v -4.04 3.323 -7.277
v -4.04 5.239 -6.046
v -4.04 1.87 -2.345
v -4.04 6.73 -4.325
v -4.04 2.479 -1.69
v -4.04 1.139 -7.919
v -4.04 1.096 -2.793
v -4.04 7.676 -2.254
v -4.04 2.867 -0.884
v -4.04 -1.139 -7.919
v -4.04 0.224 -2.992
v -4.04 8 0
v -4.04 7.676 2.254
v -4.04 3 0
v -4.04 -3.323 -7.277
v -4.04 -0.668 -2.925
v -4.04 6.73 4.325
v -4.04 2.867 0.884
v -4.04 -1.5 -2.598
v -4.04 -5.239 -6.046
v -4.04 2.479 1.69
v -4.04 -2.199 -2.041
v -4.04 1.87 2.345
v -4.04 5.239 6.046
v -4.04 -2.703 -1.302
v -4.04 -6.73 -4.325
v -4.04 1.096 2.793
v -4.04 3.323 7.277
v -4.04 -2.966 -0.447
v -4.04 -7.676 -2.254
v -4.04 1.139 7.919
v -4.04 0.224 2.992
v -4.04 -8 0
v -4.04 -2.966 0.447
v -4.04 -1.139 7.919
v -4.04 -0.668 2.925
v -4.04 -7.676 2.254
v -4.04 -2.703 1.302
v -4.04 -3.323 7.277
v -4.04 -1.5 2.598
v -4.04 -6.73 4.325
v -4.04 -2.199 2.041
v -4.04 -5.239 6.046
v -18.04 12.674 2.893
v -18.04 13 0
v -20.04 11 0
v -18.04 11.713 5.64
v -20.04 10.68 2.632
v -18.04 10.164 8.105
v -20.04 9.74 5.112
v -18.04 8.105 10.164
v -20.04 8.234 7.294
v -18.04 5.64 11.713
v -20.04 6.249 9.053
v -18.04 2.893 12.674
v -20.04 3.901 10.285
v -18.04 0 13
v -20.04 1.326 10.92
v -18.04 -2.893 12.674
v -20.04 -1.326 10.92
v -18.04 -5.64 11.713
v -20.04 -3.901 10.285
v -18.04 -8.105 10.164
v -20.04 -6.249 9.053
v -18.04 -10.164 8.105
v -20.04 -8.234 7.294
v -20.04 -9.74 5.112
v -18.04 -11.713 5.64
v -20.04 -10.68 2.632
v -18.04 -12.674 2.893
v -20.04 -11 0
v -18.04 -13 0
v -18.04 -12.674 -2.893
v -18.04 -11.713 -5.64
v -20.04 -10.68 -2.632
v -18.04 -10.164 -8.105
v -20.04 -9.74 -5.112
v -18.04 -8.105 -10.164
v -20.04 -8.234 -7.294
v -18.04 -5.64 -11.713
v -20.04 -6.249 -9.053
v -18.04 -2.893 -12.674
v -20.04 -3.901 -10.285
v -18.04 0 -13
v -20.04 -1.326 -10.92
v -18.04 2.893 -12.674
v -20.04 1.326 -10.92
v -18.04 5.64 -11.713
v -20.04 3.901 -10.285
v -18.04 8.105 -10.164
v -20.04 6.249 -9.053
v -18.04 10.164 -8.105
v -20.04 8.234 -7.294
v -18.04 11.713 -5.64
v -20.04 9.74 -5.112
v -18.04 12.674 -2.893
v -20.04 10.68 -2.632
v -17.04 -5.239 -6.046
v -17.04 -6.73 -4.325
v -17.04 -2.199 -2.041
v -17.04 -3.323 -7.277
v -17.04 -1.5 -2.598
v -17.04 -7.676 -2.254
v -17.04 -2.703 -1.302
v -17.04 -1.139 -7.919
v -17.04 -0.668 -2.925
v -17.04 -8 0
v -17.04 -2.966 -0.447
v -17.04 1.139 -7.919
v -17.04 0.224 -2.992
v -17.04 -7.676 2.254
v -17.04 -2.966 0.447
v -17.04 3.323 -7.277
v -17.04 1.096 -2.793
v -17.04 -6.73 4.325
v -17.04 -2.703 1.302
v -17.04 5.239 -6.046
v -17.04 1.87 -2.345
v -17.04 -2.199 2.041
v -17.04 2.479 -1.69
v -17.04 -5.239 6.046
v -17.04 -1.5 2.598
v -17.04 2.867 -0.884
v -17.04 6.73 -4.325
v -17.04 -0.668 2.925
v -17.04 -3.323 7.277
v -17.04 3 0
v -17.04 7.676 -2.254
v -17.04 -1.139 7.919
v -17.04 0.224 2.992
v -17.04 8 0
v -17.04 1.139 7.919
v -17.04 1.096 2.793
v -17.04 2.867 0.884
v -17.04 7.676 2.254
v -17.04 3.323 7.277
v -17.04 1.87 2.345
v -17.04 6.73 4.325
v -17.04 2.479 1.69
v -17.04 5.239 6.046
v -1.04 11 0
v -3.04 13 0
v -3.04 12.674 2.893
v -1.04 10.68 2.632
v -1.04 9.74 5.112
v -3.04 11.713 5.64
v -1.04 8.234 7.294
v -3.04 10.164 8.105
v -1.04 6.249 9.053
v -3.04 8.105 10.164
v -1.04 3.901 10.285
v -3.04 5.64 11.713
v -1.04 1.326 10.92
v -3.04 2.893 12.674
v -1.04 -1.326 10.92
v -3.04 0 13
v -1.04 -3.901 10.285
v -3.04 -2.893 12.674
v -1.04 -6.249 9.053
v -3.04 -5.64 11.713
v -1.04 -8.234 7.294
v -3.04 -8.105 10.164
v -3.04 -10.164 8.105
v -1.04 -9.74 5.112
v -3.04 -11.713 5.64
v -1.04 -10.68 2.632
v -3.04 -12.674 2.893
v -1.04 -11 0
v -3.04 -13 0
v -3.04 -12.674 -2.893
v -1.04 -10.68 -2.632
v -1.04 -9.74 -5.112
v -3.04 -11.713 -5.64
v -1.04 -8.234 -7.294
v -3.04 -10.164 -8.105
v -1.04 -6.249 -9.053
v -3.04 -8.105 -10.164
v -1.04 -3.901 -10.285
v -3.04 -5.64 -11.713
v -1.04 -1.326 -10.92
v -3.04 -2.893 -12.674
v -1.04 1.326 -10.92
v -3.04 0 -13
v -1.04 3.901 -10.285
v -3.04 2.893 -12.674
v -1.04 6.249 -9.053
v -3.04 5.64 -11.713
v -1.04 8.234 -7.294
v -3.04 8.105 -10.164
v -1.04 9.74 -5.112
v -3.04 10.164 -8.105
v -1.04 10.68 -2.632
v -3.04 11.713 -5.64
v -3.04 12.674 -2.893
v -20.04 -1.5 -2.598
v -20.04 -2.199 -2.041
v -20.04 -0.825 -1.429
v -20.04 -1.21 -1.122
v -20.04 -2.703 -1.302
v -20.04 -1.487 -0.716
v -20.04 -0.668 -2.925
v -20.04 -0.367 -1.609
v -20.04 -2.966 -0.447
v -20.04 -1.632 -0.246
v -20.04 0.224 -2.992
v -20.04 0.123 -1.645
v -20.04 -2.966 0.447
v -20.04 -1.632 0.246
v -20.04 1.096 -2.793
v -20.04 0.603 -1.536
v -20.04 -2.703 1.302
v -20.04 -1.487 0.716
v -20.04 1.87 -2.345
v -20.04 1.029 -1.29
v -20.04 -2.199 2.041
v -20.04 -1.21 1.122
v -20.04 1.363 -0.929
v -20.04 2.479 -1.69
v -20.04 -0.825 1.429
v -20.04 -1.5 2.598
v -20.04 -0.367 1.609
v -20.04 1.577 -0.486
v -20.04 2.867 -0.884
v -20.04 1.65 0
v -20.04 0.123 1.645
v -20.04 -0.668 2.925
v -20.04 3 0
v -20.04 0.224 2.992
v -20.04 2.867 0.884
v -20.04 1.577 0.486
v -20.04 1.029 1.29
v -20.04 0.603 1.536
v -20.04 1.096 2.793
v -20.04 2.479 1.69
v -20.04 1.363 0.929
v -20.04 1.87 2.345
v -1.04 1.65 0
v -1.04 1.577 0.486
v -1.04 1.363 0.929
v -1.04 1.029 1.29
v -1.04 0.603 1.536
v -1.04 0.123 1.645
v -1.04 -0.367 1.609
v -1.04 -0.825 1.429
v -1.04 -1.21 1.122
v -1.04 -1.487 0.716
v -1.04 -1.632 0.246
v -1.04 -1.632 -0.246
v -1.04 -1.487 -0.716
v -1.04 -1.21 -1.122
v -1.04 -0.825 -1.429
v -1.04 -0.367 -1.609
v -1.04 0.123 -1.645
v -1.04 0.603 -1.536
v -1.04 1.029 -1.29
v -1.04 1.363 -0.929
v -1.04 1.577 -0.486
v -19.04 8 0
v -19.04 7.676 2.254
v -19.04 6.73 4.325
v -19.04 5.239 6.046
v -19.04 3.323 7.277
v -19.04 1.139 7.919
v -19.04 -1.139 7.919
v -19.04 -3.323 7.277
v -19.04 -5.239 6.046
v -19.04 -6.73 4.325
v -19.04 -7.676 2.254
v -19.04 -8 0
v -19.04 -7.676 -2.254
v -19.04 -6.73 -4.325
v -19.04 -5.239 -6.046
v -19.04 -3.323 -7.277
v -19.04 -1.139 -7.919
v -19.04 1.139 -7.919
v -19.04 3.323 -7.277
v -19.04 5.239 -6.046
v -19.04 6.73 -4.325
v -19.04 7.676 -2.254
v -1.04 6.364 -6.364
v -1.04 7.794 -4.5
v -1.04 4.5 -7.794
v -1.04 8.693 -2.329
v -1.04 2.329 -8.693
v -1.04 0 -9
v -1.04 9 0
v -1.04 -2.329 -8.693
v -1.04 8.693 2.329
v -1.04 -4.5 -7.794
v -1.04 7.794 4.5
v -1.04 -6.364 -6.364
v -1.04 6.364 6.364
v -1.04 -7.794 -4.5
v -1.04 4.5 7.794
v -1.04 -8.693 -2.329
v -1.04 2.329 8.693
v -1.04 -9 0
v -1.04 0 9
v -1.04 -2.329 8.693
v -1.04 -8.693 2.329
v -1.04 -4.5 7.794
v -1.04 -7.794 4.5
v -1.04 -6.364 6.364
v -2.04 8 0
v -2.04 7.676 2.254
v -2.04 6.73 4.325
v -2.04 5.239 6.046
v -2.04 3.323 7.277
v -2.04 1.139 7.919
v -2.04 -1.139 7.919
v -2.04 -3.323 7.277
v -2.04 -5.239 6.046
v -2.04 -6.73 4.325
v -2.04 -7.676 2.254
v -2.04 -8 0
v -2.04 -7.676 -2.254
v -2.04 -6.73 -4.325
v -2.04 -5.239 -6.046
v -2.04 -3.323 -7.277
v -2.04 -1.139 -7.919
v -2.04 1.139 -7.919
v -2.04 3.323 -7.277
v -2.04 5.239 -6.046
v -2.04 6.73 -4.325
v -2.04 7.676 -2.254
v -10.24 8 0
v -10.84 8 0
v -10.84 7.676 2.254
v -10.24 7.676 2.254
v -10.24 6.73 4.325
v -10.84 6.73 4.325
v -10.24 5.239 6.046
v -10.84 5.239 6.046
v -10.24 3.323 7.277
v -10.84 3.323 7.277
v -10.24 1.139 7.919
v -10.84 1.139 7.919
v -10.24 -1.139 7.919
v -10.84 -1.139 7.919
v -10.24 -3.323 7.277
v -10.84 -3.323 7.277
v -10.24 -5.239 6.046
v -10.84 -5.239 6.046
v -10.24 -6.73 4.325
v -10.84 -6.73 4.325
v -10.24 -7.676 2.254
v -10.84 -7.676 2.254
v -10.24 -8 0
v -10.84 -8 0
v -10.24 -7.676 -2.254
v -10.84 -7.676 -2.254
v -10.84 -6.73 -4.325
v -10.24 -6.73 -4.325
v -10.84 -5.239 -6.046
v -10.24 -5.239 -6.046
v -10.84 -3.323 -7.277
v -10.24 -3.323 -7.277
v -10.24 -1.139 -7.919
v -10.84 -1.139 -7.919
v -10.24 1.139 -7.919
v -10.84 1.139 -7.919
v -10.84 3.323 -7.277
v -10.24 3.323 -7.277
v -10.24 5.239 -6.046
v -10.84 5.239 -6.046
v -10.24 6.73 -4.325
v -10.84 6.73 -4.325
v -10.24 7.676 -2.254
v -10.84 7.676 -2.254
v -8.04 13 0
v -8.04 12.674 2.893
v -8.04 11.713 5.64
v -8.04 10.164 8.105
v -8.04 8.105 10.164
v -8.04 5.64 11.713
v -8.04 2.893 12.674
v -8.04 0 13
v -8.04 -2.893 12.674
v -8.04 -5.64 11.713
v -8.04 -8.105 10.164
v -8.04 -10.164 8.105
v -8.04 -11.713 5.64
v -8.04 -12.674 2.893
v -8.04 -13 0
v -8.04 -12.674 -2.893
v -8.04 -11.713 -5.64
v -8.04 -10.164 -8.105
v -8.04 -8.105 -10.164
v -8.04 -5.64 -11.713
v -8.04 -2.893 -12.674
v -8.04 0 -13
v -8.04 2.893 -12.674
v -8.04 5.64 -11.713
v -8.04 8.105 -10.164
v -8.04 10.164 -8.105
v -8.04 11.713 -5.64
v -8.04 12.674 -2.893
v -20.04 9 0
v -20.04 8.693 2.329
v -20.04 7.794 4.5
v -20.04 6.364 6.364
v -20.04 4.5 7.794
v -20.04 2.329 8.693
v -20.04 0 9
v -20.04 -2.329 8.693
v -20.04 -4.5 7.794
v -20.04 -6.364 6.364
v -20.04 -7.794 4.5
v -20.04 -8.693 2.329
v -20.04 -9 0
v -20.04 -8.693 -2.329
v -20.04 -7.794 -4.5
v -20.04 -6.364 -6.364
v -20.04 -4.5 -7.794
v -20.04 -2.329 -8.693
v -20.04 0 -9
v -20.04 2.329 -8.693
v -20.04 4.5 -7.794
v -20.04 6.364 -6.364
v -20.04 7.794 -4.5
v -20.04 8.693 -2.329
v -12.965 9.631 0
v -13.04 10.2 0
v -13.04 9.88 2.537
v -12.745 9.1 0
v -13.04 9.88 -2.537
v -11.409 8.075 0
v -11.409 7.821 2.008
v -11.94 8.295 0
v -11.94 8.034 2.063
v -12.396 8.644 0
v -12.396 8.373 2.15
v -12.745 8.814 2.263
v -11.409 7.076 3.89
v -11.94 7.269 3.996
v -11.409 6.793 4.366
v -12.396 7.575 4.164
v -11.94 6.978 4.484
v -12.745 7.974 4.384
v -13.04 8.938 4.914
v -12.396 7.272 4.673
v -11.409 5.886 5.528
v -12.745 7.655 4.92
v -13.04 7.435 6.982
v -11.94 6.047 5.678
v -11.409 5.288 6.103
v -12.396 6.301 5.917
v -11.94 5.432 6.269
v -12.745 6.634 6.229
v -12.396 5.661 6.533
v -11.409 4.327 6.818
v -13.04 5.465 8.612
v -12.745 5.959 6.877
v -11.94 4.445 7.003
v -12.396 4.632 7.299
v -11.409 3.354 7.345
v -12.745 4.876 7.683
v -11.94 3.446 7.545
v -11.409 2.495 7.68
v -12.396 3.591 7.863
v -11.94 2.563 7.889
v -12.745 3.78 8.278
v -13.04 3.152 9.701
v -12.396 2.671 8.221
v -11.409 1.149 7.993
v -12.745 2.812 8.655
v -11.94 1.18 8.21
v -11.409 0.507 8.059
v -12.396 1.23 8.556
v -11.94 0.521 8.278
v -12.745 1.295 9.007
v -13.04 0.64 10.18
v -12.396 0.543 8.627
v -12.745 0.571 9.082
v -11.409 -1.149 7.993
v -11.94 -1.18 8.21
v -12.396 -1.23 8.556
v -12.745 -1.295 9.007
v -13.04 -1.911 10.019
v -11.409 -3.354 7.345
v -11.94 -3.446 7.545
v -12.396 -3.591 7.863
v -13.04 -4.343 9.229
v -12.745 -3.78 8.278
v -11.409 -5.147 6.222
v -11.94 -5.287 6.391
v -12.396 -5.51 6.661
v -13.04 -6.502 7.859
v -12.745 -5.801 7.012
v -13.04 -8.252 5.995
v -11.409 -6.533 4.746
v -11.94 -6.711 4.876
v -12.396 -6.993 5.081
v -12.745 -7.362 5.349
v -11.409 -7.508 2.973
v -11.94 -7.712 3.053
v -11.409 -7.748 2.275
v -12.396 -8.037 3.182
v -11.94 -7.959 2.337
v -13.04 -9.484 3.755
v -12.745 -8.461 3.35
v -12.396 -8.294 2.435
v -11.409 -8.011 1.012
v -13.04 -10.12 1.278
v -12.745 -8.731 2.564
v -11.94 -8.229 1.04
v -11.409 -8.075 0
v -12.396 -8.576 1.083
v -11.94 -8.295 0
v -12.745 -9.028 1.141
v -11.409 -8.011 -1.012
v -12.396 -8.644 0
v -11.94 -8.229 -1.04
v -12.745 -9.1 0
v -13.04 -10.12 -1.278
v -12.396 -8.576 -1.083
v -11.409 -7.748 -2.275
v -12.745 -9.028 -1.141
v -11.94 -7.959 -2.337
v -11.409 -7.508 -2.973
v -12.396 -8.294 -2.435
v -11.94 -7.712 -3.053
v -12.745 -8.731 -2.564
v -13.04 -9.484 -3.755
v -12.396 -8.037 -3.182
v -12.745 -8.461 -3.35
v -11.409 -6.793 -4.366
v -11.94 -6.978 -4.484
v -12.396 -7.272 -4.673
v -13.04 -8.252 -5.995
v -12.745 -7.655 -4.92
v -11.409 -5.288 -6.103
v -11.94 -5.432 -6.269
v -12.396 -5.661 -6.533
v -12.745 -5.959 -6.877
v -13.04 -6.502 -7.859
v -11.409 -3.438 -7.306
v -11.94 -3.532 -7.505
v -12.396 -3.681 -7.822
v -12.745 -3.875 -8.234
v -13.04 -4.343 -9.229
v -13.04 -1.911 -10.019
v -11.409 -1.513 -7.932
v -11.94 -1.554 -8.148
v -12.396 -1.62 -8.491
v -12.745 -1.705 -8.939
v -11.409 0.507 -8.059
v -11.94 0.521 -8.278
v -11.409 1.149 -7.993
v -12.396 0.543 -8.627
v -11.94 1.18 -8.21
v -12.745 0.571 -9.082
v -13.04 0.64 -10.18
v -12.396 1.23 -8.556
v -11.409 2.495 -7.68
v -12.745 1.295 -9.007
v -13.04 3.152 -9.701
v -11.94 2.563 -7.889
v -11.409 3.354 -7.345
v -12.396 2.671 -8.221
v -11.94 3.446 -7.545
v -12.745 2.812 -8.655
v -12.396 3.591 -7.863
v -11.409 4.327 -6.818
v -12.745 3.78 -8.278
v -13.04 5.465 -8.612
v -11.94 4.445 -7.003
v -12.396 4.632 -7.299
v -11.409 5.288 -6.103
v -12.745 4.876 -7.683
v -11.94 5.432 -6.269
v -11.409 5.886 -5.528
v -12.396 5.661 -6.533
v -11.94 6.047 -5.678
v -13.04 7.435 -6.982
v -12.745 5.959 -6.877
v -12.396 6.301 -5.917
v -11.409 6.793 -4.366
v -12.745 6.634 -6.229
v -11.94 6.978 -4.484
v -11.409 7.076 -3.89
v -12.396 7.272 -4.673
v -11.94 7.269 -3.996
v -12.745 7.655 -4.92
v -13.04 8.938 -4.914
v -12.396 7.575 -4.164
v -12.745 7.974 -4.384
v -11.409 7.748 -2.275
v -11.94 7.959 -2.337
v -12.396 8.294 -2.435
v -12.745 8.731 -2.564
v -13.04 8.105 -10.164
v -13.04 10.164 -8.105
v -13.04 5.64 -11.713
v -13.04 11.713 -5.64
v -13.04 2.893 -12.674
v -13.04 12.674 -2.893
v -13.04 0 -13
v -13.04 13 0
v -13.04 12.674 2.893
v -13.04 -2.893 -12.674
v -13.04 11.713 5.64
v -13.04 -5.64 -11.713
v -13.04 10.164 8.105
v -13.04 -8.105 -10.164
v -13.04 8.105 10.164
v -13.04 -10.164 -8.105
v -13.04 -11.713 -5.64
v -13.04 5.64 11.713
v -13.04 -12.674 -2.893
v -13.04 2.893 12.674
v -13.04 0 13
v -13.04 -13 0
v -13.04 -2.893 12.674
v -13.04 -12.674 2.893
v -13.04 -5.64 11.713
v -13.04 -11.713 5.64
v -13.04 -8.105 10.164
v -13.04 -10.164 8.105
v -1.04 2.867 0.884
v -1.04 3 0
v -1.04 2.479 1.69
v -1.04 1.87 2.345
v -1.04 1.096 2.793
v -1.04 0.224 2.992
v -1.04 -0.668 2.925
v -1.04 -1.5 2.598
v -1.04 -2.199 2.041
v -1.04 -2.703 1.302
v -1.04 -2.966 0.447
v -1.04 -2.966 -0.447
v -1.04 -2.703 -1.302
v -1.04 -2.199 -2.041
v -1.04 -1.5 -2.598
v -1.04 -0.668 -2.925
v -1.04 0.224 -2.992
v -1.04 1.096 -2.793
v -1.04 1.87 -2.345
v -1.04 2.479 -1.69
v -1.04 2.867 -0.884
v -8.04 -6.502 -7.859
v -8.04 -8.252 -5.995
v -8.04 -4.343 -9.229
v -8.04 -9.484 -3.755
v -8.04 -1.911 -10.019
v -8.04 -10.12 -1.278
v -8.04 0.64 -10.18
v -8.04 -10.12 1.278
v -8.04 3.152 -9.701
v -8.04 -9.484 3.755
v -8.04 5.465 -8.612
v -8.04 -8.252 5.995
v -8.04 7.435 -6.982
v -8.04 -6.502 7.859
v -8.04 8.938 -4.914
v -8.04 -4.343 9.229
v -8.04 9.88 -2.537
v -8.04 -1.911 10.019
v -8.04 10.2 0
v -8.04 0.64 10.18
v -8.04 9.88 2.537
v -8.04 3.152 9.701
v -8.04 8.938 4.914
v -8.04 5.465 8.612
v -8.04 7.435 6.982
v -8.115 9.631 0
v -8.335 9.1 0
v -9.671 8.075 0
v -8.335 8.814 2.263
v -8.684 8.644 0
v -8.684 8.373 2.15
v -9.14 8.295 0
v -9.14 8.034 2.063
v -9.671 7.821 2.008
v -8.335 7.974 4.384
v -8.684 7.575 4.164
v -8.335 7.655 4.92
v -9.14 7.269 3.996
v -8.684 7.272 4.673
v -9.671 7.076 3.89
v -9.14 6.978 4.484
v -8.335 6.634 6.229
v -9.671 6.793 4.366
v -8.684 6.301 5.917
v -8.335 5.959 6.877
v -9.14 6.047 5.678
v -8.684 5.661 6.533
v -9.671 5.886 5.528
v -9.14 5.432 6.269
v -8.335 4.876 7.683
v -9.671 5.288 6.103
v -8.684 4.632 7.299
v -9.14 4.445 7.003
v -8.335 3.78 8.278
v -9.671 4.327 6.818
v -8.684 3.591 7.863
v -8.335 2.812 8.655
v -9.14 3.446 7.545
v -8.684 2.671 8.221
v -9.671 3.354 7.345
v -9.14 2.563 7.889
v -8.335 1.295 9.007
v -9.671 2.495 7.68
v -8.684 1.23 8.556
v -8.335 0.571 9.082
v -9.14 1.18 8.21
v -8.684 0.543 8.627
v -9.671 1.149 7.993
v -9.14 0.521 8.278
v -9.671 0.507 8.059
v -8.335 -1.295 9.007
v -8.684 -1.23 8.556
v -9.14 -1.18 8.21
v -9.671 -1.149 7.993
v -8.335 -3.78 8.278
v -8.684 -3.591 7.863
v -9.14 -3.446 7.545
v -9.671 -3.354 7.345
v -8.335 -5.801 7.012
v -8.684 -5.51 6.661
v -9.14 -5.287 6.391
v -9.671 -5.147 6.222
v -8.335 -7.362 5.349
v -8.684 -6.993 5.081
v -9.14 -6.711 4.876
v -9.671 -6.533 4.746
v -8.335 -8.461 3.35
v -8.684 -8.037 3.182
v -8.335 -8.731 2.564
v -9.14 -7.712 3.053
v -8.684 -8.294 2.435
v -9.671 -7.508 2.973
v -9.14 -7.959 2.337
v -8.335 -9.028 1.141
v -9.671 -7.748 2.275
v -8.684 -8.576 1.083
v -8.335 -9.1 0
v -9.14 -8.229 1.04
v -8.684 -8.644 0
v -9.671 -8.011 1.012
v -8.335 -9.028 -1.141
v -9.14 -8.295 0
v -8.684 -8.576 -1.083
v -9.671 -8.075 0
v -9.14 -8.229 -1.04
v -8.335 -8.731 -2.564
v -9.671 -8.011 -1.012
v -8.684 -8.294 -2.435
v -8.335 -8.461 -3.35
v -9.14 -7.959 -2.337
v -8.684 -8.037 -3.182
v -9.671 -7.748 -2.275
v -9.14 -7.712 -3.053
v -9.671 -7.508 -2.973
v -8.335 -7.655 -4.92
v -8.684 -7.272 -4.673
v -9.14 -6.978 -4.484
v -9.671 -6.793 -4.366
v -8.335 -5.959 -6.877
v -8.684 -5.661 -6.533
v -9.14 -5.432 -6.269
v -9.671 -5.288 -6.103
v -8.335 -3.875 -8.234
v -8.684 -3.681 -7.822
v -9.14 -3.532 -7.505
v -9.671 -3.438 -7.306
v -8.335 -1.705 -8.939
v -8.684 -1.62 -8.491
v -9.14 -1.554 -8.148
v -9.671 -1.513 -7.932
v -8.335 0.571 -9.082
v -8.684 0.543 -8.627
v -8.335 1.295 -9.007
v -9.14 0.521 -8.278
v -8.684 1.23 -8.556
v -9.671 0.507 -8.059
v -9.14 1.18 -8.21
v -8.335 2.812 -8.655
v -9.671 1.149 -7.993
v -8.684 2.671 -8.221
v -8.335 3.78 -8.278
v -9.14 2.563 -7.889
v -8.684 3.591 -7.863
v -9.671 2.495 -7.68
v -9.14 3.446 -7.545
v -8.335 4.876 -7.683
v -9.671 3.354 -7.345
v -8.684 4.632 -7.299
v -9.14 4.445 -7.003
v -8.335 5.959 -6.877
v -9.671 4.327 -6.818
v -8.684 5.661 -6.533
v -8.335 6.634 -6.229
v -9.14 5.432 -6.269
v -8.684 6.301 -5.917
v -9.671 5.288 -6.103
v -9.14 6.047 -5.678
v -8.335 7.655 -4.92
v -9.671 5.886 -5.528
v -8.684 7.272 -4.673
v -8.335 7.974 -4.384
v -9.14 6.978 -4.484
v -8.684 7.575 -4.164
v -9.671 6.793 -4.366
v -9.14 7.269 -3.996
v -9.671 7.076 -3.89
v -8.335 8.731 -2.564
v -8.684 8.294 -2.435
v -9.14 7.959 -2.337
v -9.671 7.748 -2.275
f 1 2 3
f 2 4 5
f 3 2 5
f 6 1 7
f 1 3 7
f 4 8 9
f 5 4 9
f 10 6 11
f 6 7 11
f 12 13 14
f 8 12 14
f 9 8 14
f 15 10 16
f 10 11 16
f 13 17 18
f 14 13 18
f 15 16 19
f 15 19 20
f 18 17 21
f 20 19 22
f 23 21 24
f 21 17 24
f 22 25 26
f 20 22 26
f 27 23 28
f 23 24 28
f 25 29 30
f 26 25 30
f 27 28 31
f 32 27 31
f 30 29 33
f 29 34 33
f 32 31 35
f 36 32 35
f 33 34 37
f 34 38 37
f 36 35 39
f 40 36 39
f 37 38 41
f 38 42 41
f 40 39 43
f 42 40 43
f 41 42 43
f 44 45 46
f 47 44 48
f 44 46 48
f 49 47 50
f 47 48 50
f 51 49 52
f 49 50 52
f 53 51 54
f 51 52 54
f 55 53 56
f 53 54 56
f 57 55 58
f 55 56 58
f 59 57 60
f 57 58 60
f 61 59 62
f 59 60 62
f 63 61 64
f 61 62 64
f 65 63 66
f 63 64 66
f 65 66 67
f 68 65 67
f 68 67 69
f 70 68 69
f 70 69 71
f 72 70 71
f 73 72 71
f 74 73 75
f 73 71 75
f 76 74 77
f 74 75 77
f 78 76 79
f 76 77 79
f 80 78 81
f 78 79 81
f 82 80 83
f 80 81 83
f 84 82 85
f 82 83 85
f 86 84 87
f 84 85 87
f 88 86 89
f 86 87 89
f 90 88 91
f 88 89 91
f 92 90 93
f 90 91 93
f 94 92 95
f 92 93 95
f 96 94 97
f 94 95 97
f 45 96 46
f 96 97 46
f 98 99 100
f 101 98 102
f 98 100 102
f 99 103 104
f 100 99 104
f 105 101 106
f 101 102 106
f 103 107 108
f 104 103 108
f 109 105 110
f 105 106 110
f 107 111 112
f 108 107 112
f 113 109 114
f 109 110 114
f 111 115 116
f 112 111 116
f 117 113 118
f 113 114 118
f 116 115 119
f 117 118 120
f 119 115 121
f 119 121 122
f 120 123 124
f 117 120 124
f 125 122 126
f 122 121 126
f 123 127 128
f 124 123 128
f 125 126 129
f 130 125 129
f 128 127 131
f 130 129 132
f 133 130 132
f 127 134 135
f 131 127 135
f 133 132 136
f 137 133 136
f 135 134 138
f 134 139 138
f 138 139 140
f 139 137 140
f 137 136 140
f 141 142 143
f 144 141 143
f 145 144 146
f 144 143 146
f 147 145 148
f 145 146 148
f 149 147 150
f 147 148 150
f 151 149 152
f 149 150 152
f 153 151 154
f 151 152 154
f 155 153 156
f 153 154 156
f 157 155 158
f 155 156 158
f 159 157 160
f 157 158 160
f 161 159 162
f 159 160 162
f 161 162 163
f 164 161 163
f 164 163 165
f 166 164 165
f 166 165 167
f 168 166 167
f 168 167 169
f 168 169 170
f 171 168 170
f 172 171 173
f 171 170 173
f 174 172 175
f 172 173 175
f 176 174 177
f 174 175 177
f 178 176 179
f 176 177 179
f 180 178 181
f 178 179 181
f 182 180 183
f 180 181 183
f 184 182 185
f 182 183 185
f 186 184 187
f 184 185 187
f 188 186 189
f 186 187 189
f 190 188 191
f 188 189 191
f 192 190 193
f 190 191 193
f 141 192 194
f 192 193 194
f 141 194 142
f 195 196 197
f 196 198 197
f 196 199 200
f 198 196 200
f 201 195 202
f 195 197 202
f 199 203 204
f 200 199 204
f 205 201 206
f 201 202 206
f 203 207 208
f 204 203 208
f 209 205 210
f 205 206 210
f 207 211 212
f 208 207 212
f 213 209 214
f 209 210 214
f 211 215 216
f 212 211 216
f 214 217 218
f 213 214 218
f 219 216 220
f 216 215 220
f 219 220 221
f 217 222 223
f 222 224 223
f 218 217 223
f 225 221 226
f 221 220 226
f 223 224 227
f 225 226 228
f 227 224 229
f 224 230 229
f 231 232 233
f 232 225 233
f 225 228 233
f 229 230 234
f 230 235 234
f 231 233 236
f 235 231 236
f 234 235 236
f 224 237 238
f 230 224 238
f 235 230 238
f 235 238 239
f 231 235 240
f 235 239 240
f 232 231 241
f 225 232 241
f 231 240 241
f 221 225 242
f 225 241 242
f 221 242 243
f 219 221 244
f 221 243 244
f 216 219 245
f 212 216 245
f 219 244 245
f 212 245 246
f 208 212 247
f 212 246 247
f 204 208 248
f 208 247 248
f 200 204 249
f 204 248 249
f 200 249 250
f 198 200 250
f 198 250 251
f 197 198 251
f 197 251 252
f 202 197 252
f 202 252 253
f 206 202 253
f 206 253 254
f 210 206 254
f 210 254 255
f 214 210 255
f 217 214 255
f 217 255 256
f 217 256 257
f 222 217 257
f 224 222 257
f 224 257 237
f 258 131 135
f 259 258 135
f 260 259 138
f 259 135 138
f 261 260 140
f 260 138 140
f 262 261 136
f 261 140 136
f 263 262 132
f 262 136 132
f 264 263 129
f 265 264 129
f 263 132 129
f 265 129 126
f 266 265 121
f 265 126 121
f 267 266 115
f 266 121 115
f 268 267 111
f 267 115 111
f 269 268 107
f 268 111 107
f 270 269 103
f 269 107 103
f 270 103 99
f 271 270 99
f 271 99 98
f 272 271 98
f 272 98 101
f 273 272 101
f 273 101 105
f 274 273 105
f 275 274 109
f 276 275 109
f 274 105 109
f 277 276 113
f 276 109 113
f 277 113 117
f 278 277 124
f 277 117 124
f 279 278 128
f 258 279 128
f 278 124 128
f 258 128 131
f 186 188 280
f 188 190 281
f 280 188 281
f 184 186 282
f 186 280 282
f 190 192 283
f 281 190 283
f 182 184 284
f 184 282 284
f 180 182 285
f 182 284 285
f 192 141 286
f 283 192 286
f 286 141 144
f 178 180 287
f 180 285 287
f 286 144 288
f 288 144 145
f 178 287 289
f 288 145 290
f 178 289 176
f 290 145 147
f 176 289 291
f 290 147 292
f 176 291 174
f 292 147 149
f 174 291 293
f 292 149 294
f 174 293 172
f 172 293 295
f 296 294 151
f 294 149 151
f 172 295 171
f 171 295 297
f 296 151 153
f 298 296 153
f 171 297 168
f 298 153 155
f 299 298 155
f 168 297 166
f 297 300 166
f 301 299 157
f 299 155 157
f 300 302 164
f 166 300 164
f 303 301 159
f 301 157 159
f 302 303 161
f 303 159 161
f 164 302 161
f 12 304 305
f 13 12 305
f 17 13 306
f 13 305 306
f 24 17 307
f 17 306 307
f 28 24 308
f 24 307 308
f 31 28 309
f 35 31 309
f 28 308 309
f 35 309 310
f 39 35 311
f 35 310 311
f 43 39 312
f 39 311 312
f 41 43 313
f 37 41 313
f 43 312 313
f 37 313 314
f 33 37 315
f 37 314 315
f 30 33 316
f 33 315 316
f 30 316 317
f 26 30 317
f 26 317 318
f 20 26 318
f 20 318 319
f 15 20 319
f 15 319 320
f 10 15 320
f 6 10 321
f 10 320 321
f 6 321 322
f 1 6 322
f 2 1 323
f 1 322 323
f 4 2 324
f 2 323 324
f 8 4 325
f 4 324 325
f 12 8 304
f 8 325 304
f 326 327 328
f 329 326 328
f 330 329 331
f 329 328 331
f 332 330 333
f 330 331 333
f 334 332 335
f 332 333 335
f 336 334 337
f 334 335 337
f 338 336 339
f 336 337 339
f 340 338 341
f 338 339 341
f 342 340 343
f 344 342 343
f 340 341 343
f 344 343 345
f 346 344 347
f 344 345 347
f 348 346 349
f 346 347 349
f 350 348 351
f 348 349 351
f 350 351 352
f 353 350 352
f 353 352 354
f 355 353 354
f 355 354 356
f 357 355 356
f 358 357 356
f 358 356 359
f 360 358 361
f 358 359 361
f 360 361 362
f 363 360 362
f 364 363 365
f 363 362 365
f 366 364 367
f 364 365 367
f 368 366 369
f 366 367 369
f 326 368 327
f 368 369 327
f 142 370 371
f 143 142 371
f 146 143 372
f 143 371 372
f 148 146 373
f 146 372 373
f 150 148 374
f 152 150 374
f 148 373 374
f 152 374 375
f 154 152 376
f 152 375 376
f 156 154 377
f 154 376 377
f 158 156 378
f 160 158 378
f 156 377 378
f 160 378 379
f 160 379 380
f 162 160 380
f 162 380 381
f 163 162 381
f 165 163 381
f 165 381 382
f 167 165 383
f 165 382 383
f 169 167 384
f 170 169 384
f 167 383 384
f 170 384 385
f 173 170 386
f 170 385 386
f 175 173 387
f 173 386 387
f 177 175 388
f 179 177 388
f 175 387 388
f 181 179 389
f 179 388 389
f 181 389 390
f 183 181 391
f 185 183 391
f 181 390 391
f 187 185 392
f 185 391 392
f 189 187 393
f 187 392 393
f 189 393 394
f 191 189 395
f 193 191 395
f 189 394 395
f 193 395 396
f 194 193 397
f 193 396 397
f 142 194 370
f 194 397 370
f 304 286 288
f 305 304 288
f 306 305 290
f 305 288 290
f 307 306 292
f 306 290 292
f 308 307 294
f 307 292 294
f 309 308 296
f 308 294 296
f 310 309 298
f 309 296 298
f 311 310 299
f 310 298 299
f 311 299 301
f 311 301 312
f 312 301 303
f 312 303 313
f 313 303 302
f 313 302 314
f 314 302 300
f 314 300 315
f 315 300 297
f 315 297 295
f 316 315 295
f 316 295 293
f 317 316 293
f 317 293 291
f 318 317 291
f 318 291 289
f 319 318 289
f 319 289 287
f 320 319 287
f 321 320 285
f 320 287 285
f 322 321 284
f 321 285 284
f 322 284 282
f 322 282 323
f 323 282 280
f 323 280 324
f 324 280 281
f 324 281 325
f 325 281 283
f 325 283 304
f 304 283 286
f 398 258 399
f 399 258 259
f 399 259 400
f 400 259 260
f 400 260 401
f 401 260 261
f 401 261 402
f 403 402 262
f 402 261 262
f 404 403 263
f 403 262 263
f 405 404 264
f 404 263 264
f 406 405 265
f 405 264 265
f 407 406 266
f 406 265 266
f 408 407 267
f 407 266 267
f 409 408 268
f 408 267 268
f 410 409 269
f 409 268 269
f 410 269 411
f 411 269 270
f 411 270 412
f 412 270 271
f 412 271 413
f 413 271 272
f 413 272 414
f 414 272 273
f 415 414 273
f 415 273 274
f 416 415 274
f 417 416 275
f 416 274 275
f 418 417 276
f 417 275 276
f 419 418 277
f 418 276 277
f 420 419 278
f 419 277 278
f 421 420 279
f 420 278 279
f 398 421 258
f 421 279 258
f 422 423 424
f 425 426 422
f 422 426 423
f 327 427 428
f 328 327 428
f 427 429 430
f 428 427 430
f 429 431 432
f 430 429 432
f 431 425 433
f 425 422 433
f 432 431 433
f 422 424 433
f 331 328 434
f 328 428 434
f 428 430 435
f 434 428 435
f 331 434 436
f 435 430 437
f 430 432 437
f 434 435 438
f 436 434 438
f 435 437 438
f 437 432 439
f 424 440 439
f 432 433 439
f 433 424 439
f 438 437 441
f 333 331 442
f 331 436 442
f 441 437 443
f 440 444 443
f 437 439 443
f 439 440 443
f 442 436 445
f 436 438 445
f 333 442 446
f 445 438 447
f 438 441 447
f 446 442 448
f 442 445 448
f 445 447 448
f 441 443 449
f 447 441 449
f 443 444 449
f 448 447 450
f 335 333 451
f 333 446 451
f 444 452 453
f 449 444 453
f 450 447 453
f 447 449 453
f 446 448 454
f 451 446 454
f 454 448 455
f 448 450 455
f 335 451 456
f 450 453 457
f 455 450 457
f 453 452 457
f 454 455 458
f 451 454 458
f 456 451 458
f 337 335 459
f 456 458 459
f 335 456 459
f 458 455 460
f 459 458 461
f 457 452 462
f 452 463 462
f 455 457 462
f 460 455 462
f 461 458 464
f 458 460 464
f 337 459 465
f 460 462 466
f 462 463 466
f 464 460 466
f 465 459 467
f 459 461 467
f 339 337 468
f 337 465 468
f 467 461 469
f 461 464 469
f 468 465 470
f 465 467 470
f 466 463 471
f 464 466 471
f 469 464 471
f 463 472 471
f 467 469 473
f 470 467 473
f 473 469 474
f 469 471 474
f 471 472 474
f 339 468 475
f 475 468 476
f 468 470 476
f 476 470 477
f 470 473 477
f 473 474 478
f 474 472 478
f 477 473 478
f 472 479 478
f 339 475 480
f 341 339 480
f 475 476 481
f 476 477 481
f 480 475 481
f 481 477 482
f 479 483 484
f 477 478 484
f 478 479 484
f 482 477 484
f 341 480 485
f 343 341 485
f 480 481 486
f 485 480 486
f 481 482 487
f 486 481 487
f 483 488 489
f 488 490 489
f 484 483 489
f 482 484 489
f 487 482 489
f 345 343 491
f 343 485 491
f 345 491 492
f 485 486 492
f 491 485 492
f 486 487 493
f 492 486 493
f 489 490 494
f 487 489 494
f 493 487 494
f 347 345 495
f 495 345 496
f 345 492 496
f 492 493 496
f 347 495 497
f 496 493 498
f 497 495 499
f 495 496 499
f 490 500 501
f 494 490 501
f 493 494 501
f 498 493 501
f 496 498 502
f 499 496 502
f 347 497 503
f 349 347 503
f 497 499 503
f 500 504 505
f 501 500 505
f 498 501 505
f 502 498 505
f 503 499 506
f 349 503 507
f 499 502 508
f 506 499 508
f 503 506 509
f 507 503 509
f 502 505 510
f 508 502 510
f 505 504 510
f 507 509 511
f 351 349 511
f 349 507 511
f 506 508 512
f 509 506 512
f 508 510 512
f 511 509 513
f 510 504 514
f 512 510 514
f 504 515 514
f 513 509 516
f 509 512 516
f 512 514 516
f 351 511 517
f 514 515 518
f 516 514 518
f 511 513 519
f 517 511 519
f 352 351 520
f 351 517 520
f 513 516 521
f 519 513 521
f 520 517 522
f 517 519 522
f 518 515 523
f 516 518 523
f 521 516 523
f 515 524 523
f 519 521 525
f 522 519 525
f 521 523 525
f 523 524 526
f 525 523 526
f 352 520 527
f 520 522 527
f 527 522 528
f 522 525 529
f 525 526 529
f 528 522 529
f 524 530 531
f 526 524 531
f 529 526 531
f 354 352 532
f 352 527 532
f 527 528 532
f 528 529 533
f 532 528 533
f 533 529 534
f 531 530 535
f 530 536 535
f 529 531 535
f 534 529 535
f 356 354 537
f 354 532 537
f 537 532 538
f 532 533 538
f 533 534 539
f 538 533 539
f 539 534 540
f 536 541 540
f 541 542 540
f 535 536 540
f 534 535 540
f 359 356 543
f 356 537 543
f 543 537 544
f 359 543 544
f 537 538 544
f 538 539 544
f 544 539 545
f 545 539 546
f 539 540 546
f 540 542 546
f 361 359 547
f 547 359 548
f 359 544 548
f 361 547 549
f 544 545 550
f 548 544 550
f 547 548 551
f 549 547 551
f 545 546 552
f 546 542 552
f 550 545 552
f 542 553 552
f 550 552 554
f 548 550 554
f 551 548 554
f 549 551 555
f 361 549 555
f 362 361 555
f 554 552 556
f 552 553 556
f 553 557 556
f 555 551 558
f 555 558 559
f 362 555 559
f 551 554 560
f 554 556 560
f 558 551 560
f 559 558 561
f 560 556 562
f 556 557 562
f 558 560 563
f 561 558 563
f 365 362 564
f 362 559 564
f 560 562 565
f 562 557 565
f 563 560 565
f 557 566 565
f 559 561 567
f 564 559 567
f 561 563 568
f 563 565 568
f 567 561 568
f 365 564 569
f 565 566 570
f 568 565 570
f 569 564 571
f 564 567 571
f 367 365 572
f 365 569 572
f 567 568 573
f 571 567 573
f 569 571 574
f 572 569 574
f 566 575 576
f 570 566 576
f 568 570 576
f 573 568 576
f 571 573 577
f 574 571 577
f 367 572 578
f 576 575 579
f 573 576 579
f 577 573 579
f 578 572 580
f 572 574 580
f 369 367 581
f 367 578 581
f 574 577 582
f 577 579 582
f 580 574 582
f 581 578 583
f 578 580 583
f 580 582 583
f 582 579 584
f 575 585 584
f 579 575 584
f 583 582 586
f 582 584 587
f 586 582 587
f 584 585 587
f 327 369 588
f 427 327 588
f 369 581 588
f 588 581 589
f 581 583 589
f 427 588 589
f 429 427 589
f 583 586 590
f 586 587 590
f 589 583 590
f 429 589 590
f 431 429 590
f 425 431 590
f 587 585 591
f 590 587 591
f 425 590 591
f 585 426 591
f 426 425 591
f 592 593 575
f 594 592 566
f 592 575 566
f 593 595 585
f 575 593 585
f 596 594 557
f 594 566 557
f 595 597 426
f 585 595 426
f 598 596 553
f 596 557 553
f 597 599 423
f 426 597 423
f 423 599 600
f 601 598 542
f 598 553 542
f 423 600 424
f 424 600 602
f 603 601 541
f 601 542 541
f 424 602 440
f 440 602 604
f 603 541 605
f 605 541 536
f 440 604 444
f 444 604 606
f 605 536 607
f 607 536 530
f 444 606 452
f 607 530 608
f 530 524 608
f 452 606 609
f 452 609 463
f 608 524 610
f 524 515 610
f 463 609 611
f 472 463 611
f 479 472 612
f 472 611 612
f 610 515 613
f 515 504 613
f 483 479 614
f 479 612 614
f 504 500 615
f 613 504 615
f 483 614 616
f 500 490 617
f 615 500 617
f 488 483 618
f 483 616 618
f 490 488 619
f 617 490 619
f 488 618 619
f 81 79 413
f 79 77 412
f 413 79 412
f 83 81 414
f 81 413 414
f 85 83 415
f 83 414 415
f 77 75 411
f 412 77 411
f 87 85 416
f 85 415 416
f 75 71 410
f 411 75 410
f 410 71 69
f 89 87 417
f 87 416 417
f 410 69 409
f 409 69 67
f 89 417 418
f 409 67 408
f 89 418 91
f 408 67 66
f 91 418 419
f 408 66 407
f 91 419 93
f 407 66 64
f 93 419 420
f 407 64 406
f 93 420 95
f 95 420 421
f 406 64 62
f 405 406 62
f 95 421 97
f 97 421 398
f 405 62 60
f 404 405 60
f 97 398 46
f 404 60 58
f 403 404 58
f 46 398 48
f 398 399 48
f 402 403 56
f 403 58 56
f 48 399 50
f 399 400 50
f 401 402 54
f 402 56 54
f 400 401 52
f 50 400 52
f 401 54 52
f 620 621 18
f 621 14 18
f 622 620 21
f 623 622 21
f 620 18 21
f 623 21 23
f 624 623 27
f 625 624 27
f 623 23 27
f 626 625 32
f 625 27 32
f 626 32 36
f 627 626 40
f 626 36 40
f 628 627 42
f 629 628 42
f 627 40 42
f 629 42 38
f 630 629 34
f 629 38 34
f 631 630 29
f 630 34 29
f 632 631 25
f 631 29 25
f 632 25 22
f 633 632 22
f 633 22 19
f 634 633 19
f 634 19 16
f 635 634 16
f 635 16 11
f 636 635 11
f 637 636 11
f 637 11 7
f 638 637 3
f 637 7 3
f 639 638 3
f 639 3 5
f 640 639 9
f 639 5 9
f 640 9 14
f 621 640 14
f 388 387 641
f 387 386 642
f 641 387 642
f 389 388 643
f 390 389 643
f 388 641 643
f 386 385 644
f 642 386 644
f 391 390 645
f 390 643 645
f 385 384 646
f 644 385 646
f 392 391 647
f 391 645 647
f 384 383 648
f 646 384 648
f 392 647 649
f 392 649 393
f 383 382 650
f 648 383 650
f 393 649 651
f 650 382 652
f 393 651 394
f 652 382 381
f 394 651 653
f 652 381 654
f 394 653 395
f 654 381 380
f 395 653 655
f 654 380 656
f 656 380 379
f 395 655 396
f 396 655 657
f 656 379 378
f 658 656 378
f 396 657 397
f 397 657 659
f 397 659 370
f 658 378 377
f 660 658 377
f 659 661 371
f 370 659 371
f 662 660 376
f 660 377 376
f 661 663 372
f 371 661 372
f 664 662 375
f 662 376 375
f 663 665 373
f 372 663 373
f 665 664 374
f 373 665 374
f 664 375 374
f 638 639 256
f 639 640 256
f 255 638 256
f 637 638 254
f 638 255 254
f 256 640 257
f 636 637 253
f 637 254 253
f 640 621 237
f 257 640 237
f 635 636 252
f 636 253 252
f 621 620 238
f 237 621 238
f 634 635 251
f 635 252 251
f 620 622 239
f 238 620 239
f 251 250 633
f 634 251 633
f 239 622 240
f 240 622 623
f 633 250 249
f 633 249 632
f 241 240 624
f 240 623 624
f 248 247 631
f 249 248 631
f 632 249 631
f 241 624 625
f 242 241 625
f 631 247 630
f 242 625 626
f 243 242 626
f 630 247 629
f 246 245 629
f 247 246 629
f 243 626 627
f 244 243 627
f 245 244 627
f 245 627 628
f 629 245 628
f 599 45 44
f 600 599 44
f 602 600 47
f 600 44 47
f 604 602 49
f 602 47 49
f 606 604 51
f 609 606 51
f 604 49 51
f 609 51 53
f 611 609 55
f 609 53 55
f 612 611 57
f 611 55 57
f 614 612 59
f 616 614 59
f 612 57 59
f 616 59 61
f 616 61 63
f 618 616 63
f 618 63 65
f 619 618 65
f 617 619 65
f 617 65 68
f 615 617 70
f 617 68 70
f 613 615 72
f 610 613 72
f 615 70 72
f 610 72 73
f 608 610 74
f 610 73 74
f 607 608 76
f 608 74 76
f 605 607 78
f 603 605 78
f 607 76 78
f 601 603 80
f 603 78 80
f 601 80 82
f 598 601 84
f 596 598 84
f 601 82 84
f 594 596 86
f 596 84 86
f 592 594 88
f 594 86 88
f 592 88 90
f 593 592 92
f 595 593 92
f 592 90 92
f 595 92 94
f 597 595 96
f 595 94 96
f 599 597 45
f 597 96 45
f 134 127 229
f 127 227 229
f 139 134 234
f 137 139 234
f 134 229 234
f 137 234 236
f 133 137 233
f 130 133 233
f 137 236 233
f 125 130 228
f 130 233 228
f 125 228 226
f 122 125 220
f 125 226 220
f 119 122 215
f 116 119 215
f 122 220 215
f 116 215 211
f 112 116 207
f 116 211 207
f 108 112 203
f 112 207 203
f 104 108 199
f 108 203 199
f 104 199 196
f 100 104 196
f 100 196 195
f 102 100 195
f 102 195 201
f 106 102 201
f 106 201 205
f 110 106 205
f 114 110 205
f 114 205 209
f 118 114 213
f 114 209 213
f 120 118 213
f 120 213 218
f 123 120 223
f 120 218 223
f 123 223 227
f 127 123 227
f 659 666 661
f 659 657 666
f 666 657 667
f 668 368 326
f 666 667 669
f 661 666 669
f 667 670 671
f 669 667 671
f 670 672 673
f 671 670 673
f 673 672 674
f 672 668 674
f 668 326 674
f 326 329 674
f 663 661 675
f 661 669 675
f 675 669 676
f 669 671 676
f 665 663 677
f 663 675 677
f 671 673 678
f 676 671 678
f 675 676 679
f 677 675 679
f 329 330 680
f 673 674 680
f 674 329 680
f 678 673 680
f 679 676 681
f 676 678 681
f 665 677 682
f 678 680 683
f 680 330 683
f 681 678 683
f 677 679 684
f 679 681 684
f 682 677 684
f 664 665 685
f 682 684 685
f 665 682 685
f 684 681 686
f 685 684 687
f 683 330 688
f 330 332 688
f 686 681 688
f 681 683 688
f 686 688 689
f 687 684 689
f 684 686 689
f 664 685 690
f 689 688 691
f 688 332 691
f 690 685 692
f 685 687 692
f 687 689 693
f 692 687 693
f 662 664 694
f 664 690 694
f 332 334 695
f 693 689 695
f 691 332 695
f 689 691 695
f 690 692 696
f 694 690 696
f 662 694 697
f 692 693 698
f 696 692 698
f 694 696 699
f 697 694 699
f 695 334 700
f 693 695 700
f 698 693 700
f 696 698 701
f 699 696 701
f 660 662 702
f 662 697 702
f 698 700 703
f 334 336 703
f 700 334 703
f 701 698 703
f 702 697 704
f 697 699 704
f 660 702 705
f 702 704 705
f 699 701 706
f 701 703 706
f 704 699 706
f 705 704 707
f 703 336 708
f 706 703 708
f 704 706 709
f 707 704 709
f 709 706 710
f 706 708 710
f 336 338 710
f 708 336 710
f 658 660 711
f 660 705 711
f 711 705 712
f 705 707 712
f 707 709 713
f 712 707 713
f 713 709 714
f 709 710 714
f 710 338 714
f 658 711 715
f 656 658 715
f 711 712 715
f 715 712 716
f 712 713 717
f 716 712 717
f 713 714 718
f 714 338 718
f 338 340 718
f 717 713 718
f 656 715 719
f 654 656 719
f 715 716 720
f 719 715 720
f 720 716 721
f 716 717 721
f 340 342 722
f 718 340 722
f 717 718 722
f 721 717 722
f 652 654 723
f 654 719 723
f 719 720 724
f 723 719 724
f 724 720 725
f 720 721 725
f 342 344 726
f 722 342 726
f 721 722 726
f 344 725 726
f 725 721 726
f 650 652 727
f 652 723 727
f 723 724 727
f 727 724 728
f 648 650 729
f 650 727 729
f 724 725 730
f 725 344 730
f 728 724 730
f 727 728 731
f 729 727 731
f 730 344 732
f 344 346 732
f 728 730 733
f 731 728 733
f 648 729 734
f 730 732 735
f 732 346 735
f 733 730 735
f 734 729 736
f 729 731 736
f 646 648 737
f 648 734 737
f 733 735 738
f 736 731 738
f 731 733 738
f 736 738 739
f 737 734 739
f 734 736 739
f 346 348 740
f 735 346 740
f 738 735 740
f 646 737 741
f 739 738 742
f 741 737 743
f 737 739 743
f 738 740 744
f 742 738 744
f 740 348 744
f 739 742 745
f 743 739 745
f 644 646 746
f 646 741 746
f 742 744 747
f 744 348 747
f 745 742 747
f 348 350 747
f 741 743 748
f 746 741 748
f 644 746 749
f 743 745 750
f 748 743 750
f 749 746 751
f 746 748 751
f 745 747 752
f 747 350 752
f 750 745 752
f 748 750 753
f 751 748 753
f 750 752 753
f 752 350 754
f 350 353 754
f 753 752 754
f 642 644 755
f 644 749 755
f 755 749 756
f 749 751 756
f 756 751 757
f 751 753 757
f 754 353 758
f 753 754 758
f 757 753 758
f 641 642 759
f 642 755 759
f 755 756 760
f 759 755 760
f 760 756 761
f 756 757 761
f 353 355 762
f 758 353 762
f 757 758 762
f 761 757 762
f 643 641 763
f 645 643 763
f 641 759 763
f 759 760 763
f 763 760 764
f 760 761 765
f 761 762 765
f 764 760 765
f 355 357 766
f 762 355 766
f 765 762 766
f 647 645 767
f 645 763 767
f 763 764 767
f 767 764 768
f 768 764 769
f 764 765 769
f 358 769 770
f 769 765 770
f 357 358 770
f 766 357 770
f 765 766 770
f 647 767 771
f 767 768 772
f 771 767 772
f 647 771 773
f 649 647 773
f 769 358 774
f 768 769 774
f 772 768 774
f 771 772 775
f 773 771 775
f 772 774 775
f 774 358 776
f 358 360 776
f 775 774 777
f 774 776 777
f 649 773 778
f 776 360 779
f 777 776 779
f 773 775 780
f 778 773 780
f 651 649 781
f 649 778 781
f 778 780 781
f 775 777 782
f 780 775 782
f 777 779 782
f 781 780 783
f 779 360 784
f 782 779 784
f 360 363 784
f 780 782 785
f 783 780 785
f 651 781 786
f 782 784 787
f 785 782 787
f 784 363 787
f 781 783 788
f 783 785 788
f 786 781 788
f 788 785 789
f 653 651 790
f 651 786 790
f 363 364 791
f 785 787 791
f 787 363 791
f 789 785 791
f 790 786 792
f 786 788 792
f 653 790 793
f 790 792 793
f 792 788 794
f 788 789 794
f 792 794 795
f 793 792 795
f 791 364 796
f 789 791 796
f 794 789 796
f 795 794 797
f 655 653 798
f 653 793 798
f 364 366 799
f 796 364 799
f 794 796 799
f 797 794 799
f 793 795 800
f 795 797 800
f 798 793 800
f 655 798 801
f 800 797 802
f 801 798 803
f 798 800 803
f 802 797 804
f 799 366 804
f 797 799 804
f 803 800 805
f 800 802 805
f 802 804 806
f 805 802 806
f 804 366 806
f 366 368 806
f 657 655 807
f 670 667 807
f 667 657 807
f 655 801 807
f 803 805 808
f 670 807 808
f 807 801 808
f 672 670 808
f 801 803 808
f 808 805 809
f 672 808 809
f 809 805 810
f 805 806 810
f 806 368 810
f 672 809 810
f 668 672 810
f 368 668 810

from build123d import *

# Parameters (mm, degrees)
F2_SIZE = 1
F3_SIZE = 2
F4_R    = 2.2
F6_D    = 3.3


with BuildPart() as f1:
    # F0 (on Top) → F1 (revolve)
    with BuildSketch(Plane.XY):
        Polygon((-20.039994, 3), (-20.039994, 0), (-1.039994, 0), (-1.039994, 3), (-4.039994, 3), (-4.039994, 8), (-1.039994, 8), (-1.039994, 13), (-8.039994, 13), (-8.039994, 8), (-13.039994, 8), (-13.039994, 13), (-20.039994, 13), (-20.039994, 8), (-17.039994, 8), (-17.039994, 3), align=None)
    revolve(axis=Axis((-10.68385, 0, 0), (1, 0, 0)))

    # F2
    f2_edges = [f1.edges().sort_by_distance(p)[0] for p in [
        (-1.039994, -8, 0),
        (-20.039994, -8, 0),
    ]]
    chamfer(f2_edges, length=F2_SIZE)

    # F3
    f3_edges = [f1.edges().sort_by_distance(p)[0] for p in [
        (-20.039994, -13, 0),
        (-1.039994, -13, 0),
    ]]
    chamfer(f3_edges, length=F3_SIZE)

    # F4
    f4_edges = [f1.edges().sort_by_distance(p)[0] for p in [
        (-13.039994, -8, 0),
        (-8.039994, -8, 0),
    ]]
    fillet(f4_edges, radius=F4_R)

    # F6 (through all)
    with Locations(Plane(origin=(-20.039994, 0, 0), x_dir=(0, -1, 0), z_dir=(-1, 0, 0))):
        with Locations((0, 0)):
            Hole(F6_D / 2)


solid = f1.part
